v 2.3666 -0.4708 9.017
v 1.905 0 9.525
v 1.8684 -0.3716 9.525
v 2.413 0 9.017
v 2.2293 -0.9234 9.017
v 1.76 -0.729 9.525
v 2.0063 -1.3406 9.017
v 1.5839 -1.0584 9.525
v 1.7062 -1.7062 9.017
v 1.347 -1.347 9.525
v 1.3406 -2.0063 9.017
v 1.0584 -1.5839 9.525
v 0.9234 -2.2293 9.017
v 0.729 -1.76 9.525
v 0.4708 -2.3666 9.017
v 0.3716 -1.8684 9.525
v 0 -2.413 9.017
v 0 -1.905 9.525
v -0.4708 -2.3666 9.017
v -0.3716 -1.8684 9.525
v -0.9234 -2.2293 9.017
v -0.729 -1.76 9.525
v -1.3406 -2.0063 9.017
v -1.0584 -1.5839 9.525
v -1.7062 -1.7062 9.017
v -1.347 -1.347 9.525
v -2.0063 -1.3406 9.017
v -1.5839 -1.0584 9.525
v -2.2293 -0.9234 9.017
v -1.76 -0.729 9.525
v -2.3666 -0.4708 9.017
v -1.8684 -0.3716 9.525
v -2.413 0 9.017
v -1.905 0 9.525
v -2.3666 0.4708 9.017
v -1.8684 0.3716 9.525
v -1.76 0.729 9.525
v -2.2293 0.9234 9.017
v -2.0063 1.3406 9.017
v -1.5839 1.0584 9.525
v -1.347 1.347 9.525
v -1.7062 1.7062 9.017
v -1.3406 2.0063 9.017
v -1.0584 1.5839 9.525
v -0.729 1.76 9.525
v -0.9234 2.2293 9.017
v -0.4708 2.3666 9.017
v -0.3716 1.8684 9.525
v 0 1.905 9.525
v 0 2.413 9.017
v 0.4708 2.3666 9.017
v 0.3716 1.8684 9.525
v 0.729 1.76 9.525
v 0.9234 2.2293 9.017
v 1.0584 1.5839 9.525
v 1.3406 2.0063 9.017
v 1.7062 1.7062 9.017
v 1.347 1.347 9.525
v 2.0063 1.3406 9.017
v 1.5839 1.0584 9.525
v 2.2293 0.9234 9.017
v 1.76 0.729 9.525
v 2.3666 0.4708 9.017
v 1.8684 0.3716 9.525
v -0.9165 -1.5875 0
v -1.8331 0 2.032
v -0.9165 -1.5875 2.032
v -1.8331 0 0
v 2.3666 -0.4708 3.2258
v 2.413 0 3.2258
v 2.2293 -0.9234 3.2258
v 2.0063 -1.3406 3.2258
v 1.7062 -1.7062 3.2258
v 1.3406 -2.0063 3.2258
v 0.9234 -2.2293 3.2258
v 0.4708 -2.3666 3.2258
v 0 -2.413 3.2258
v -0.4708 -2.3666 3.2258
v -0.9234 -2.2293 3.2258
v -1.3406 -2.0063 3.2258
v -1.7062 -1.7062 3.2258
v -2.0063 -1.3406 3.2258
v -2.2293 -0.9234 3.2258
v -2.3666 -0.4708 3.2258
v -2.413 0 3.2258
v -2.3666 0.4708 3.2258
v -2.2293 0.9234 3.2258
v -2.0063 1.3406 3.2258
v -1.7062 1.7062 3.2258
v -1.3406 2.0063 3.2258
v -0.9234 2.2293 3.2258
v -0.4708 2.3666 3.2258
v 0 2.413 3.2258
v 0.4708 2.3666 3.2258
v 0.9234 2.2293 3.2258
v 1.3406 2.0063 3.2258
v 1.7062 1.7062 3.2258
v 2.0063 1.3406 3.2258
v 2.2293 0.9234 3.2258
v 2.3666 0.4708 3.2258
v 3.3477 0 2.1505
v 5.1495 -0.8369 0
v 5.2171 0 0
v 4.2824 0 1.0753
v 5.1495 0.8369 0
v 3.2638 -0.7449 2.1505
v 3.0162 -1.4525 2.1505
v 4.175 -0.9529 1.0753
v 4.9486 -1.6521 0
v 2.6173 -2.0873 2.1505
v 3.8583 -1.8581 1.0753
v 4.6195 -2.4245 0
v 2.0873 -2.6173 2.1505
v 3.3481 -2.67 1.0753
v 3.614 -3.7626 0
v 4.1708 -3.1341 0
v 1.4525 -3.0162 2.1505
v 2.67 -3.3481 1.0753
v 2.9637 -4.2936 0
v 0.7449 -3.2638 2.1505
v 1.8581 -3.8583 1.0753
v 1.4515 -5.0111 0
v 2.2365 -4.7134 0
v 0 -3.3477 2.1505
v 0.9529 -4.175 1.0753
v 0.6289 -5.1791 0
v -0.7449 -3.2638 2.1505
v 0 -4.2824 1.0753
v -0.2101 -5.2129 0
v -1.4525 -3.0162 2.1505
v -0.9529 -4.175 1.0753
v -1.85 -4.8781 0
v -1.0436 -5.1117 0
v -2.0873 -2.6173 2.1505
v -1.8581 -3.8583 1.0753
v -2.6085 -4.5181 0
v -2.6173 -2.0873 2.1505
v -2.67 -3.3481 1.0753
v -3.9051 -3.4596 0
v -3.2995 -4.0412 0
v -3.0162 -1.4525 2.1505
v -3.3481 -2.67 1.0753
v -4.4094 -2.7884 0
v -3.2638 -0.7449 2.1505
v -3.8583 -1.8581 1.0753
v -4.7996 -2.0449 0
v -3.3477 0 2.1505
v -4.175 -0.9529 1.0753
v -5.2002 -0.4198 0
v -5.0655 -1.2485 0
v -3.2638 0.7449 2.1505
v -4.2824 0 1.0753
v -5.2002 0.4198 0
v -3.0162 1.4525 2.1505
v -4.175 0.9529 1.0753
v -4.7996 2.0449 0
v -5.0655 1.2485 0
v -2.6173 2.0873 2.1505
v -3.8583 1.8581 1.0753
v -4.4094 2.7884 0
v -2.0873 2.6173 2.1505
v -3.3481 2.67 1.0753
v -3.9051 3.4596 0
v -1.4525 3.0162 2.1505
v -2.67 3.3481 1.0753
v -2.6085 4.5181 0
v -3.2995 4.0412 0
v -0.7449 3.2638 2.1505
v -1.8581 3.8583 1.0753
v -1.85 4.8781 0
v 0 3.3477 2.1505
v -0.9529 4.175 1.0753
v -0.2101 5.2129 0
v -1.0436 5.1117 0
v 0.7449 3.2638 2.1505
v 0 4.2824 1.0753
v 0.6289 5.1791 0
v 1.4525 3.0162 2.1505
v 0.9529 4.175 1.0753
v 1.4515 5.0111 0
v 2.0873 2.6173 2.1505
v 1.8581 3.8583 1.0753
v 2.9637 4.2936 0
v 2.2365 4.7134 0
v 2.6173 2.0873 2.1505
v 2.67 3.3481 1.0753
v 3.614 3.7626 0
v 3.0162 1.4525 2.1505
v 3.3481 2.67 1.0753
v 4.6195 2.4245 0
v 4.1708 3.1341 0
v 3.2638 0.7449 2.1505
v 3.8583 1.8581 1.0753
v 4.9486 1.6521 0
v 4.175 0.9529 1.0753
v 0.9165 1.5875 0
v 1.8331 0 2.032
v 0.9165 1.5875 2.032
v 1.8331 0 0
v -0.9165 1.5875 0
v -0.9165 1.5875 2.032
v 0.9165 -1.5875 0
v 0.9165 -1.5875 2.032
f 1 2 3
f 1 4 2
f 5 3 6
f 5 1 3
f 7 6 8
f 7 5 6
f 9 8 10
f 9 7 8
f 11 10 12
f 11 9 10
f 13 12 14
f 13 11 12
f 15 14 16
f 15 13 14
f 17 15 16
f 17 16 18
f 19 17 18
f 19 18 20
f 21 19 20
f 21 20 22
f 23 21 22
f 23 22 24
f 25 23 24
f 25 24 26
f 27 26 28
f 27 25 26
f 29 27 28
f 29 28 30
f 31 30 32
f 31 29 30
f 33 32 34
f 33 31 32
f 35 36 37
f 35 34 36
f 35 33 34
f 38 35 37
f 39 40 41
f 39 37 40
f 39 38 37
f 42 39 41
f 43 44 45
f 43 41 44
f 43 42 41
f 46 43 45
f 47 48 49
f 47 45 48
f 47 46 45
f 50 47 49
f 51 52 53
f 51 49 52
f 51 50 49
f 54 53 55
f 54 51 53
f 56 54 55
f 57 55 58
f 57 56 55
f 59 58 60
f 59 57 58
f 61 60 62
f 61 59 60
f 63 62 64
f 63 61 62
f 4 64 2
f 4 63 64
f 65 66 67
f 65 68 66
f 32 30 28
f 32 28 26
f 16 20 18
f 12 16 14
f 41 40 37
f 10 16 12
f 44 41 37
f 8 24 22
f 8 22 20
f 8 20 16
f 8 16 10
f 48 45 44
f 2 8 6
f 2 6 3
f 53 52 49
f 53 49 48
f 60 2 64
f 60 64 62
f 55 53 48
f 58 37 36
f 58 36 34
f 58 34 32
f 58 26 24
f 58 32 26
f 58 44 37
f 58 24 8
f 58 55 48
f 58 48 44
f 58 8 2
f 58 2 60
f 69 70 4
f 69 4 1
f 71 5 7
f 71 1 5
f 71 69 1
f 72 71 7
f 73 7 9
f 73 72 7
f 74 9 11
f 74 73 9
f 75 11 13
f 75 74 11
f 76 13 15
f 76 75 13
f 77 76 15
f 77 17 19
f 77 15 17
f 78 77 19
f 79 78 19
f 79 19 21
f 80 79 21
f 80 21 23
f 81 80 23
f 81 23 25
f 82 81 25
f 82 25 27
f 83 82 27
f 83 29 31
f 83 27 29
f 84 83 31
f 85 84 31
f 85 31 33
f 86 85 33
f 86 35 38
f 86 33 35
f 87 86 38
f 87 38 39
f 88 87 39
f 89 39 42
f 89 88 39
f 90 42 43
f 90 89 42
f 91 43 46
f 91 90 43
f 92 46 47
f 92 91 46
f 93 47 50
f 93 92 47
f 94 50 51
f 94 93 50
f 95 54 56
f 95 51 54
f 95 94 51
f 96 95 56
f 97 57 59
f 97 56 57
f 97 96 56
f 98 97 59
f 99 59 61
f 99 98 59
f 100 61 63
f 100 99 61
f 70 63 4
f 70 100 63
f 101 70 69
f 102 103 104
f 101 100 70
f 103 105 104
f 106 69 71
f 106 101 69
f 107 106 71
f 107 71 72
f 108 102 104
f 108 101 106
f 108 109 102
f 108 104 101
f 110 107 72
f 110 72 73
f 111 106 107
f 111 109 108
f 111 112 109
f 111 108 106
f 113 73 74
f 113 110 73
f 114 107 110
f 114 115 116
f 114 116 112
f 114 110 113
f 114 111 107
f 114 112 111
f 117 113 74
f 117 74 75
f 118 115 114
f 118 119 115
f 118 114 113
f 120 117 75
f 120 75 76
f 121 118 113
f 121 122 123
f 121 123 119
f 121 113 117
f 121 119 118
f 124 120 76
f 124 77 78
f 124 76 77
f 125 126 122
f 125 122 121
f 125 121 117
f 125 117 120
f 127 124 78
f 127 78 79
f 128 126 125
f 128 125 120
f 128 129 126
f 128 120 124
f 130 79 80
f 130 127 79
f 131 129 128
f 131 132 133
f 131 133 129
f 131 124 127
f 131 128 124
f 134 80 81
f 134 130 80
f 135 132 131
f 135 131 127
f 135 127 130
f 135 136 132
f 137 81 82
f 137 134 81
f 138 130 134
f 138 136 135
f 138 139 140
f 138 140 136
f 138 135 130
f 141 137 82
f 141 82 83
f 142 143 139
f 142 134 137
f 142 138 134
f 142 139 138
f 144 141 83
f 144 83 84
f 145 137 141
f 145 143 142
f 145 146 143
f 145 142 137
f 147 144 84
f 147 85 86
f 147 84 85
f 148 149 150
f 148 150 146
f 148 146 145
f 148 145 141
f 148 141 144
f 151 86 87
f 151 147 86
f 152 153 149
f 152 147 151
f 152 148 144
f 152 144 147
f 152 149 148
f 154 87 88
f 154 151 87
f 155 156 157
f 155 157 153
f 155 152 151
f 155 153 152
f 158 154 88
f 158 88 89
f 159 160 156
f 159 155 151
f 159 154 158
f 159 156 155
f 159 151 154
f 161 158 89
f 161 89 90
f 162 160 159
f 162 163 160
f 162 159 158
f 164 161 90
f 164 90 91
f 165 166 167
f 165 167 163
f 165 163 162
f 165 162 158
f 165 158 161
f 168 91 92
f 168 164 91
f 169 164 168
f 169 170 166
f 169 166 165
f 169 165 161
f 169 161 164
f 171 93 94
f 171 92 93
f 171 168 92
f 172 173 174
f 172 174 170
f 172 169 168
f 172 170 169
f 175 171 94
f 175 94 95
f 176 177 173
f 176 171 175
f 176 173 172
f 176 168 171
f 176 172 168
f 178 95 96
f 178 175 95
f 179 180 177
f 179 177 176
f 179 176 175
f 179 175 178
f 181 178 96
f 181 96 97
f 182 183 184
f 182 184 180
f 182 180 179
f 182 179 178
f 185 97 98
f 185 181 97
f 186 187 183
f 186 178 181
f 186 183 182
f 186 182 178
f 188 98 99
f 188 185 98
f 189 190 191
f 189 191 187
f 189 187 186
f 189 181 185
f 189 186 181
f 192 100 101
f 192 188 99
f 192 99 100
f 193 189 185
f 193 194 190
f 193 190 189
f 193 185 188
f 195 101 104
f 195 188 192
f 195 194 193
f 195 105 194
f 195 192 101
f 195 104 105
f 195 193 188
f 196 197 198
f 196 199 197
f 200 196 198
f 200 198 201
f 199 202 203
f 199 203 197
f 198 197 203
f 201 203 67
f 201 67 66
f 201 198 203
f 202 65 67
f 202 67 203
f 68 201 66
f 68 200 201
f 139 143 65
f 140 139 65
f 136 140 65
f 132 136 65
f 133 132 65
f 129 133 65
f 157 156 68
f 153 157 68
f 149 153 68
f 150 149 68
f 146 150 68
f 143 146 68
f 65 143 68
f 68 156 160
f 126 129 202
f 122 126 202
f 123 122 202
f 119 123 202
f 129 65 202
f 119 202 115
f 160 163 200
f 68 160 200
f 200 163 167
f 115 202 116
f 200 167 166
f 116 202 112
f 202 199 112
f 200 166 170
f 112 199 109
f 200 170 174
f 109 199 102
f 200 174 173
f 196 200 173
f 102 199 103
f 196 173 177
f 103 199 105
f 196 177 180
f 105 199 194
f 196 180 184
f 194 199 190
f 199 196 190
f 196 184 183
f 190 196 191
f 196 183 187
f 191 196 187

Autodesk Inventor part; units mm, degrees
ref_plane "YZ Plane" through (0, 0, 0) normal (1, 0, 0) x (0, 1, 0)
ref_plane "XZ Plane" through (0, 0, 0) normal (0, 1, 0) x (-1, 0, 0)
ref_plane "XY Plane" through (0, 0, 0) normal (0, 0, 1) x (1, 0, 0)
sketch "Sketch1" plane through (0, 0, 0) normal (0, 1, 0) x (-1, 0, 0)
  line L0 (0, 0) -> (0, 9.525)
  line L1 (0, 9.525) -> (-2.413, 9.525)
  line L2 (-2.413, 9.525) -> (-2.413, 3.2258)
  line L3 (-2.413, 3.2258) -> (-5.2171, 0)
  line L4 (-5.2171, 0) -> (0, 0)
  dimension "d0" = 4.826
  dimension "d2" = 9.525
  dimension "d3" = 41
  dimension "d4" = 3.2258
  dimension "d5" = 5.2172
revolve "Revolution1" add sketch "Sketch1" angle 360 about axis through (0, 0, 0) along (0, 0, 1)
thread "Thread1" size "10-32 UNF" class "2A" standard "ANSI Unified Screw Threads" full length
chamfer "Chamfer1" distance 0.508 angle 45 1 edges at (-2.413, 0, 9.525)
sketch "Sketch2" plane through (0, 0, 0) normal (0, 0, -1) x (-1, 0, 0)
  circle A0 centre (0, 0) radius 5.2171 projected
  line L0 (0.9165, -1.5875) -> (-0.9165, -1.5875)
  line L1 (-0.9165, -1.5875) -> (-1.8331, 0)
  line L2 (-1.8331, 0) -> (-0.9165, 1.5875)
  line L3 (-0.9165, 1.5875) -> (0.9165, 1.5875)
  line L4 (0.9165, 1.5875) -> (1.8331, 0)
  line L5 (1.8331, 0) -> (0.9165, -1.5875)
  dimension "d12" = 3.175
extrude "Extrusion1" cut sketch "Sketch2" against normal blind 2.032 contours L0 L1 L2 L3 L4 L5
properties part number "10-32 Flathead x375" material "Steel, Alloy"
